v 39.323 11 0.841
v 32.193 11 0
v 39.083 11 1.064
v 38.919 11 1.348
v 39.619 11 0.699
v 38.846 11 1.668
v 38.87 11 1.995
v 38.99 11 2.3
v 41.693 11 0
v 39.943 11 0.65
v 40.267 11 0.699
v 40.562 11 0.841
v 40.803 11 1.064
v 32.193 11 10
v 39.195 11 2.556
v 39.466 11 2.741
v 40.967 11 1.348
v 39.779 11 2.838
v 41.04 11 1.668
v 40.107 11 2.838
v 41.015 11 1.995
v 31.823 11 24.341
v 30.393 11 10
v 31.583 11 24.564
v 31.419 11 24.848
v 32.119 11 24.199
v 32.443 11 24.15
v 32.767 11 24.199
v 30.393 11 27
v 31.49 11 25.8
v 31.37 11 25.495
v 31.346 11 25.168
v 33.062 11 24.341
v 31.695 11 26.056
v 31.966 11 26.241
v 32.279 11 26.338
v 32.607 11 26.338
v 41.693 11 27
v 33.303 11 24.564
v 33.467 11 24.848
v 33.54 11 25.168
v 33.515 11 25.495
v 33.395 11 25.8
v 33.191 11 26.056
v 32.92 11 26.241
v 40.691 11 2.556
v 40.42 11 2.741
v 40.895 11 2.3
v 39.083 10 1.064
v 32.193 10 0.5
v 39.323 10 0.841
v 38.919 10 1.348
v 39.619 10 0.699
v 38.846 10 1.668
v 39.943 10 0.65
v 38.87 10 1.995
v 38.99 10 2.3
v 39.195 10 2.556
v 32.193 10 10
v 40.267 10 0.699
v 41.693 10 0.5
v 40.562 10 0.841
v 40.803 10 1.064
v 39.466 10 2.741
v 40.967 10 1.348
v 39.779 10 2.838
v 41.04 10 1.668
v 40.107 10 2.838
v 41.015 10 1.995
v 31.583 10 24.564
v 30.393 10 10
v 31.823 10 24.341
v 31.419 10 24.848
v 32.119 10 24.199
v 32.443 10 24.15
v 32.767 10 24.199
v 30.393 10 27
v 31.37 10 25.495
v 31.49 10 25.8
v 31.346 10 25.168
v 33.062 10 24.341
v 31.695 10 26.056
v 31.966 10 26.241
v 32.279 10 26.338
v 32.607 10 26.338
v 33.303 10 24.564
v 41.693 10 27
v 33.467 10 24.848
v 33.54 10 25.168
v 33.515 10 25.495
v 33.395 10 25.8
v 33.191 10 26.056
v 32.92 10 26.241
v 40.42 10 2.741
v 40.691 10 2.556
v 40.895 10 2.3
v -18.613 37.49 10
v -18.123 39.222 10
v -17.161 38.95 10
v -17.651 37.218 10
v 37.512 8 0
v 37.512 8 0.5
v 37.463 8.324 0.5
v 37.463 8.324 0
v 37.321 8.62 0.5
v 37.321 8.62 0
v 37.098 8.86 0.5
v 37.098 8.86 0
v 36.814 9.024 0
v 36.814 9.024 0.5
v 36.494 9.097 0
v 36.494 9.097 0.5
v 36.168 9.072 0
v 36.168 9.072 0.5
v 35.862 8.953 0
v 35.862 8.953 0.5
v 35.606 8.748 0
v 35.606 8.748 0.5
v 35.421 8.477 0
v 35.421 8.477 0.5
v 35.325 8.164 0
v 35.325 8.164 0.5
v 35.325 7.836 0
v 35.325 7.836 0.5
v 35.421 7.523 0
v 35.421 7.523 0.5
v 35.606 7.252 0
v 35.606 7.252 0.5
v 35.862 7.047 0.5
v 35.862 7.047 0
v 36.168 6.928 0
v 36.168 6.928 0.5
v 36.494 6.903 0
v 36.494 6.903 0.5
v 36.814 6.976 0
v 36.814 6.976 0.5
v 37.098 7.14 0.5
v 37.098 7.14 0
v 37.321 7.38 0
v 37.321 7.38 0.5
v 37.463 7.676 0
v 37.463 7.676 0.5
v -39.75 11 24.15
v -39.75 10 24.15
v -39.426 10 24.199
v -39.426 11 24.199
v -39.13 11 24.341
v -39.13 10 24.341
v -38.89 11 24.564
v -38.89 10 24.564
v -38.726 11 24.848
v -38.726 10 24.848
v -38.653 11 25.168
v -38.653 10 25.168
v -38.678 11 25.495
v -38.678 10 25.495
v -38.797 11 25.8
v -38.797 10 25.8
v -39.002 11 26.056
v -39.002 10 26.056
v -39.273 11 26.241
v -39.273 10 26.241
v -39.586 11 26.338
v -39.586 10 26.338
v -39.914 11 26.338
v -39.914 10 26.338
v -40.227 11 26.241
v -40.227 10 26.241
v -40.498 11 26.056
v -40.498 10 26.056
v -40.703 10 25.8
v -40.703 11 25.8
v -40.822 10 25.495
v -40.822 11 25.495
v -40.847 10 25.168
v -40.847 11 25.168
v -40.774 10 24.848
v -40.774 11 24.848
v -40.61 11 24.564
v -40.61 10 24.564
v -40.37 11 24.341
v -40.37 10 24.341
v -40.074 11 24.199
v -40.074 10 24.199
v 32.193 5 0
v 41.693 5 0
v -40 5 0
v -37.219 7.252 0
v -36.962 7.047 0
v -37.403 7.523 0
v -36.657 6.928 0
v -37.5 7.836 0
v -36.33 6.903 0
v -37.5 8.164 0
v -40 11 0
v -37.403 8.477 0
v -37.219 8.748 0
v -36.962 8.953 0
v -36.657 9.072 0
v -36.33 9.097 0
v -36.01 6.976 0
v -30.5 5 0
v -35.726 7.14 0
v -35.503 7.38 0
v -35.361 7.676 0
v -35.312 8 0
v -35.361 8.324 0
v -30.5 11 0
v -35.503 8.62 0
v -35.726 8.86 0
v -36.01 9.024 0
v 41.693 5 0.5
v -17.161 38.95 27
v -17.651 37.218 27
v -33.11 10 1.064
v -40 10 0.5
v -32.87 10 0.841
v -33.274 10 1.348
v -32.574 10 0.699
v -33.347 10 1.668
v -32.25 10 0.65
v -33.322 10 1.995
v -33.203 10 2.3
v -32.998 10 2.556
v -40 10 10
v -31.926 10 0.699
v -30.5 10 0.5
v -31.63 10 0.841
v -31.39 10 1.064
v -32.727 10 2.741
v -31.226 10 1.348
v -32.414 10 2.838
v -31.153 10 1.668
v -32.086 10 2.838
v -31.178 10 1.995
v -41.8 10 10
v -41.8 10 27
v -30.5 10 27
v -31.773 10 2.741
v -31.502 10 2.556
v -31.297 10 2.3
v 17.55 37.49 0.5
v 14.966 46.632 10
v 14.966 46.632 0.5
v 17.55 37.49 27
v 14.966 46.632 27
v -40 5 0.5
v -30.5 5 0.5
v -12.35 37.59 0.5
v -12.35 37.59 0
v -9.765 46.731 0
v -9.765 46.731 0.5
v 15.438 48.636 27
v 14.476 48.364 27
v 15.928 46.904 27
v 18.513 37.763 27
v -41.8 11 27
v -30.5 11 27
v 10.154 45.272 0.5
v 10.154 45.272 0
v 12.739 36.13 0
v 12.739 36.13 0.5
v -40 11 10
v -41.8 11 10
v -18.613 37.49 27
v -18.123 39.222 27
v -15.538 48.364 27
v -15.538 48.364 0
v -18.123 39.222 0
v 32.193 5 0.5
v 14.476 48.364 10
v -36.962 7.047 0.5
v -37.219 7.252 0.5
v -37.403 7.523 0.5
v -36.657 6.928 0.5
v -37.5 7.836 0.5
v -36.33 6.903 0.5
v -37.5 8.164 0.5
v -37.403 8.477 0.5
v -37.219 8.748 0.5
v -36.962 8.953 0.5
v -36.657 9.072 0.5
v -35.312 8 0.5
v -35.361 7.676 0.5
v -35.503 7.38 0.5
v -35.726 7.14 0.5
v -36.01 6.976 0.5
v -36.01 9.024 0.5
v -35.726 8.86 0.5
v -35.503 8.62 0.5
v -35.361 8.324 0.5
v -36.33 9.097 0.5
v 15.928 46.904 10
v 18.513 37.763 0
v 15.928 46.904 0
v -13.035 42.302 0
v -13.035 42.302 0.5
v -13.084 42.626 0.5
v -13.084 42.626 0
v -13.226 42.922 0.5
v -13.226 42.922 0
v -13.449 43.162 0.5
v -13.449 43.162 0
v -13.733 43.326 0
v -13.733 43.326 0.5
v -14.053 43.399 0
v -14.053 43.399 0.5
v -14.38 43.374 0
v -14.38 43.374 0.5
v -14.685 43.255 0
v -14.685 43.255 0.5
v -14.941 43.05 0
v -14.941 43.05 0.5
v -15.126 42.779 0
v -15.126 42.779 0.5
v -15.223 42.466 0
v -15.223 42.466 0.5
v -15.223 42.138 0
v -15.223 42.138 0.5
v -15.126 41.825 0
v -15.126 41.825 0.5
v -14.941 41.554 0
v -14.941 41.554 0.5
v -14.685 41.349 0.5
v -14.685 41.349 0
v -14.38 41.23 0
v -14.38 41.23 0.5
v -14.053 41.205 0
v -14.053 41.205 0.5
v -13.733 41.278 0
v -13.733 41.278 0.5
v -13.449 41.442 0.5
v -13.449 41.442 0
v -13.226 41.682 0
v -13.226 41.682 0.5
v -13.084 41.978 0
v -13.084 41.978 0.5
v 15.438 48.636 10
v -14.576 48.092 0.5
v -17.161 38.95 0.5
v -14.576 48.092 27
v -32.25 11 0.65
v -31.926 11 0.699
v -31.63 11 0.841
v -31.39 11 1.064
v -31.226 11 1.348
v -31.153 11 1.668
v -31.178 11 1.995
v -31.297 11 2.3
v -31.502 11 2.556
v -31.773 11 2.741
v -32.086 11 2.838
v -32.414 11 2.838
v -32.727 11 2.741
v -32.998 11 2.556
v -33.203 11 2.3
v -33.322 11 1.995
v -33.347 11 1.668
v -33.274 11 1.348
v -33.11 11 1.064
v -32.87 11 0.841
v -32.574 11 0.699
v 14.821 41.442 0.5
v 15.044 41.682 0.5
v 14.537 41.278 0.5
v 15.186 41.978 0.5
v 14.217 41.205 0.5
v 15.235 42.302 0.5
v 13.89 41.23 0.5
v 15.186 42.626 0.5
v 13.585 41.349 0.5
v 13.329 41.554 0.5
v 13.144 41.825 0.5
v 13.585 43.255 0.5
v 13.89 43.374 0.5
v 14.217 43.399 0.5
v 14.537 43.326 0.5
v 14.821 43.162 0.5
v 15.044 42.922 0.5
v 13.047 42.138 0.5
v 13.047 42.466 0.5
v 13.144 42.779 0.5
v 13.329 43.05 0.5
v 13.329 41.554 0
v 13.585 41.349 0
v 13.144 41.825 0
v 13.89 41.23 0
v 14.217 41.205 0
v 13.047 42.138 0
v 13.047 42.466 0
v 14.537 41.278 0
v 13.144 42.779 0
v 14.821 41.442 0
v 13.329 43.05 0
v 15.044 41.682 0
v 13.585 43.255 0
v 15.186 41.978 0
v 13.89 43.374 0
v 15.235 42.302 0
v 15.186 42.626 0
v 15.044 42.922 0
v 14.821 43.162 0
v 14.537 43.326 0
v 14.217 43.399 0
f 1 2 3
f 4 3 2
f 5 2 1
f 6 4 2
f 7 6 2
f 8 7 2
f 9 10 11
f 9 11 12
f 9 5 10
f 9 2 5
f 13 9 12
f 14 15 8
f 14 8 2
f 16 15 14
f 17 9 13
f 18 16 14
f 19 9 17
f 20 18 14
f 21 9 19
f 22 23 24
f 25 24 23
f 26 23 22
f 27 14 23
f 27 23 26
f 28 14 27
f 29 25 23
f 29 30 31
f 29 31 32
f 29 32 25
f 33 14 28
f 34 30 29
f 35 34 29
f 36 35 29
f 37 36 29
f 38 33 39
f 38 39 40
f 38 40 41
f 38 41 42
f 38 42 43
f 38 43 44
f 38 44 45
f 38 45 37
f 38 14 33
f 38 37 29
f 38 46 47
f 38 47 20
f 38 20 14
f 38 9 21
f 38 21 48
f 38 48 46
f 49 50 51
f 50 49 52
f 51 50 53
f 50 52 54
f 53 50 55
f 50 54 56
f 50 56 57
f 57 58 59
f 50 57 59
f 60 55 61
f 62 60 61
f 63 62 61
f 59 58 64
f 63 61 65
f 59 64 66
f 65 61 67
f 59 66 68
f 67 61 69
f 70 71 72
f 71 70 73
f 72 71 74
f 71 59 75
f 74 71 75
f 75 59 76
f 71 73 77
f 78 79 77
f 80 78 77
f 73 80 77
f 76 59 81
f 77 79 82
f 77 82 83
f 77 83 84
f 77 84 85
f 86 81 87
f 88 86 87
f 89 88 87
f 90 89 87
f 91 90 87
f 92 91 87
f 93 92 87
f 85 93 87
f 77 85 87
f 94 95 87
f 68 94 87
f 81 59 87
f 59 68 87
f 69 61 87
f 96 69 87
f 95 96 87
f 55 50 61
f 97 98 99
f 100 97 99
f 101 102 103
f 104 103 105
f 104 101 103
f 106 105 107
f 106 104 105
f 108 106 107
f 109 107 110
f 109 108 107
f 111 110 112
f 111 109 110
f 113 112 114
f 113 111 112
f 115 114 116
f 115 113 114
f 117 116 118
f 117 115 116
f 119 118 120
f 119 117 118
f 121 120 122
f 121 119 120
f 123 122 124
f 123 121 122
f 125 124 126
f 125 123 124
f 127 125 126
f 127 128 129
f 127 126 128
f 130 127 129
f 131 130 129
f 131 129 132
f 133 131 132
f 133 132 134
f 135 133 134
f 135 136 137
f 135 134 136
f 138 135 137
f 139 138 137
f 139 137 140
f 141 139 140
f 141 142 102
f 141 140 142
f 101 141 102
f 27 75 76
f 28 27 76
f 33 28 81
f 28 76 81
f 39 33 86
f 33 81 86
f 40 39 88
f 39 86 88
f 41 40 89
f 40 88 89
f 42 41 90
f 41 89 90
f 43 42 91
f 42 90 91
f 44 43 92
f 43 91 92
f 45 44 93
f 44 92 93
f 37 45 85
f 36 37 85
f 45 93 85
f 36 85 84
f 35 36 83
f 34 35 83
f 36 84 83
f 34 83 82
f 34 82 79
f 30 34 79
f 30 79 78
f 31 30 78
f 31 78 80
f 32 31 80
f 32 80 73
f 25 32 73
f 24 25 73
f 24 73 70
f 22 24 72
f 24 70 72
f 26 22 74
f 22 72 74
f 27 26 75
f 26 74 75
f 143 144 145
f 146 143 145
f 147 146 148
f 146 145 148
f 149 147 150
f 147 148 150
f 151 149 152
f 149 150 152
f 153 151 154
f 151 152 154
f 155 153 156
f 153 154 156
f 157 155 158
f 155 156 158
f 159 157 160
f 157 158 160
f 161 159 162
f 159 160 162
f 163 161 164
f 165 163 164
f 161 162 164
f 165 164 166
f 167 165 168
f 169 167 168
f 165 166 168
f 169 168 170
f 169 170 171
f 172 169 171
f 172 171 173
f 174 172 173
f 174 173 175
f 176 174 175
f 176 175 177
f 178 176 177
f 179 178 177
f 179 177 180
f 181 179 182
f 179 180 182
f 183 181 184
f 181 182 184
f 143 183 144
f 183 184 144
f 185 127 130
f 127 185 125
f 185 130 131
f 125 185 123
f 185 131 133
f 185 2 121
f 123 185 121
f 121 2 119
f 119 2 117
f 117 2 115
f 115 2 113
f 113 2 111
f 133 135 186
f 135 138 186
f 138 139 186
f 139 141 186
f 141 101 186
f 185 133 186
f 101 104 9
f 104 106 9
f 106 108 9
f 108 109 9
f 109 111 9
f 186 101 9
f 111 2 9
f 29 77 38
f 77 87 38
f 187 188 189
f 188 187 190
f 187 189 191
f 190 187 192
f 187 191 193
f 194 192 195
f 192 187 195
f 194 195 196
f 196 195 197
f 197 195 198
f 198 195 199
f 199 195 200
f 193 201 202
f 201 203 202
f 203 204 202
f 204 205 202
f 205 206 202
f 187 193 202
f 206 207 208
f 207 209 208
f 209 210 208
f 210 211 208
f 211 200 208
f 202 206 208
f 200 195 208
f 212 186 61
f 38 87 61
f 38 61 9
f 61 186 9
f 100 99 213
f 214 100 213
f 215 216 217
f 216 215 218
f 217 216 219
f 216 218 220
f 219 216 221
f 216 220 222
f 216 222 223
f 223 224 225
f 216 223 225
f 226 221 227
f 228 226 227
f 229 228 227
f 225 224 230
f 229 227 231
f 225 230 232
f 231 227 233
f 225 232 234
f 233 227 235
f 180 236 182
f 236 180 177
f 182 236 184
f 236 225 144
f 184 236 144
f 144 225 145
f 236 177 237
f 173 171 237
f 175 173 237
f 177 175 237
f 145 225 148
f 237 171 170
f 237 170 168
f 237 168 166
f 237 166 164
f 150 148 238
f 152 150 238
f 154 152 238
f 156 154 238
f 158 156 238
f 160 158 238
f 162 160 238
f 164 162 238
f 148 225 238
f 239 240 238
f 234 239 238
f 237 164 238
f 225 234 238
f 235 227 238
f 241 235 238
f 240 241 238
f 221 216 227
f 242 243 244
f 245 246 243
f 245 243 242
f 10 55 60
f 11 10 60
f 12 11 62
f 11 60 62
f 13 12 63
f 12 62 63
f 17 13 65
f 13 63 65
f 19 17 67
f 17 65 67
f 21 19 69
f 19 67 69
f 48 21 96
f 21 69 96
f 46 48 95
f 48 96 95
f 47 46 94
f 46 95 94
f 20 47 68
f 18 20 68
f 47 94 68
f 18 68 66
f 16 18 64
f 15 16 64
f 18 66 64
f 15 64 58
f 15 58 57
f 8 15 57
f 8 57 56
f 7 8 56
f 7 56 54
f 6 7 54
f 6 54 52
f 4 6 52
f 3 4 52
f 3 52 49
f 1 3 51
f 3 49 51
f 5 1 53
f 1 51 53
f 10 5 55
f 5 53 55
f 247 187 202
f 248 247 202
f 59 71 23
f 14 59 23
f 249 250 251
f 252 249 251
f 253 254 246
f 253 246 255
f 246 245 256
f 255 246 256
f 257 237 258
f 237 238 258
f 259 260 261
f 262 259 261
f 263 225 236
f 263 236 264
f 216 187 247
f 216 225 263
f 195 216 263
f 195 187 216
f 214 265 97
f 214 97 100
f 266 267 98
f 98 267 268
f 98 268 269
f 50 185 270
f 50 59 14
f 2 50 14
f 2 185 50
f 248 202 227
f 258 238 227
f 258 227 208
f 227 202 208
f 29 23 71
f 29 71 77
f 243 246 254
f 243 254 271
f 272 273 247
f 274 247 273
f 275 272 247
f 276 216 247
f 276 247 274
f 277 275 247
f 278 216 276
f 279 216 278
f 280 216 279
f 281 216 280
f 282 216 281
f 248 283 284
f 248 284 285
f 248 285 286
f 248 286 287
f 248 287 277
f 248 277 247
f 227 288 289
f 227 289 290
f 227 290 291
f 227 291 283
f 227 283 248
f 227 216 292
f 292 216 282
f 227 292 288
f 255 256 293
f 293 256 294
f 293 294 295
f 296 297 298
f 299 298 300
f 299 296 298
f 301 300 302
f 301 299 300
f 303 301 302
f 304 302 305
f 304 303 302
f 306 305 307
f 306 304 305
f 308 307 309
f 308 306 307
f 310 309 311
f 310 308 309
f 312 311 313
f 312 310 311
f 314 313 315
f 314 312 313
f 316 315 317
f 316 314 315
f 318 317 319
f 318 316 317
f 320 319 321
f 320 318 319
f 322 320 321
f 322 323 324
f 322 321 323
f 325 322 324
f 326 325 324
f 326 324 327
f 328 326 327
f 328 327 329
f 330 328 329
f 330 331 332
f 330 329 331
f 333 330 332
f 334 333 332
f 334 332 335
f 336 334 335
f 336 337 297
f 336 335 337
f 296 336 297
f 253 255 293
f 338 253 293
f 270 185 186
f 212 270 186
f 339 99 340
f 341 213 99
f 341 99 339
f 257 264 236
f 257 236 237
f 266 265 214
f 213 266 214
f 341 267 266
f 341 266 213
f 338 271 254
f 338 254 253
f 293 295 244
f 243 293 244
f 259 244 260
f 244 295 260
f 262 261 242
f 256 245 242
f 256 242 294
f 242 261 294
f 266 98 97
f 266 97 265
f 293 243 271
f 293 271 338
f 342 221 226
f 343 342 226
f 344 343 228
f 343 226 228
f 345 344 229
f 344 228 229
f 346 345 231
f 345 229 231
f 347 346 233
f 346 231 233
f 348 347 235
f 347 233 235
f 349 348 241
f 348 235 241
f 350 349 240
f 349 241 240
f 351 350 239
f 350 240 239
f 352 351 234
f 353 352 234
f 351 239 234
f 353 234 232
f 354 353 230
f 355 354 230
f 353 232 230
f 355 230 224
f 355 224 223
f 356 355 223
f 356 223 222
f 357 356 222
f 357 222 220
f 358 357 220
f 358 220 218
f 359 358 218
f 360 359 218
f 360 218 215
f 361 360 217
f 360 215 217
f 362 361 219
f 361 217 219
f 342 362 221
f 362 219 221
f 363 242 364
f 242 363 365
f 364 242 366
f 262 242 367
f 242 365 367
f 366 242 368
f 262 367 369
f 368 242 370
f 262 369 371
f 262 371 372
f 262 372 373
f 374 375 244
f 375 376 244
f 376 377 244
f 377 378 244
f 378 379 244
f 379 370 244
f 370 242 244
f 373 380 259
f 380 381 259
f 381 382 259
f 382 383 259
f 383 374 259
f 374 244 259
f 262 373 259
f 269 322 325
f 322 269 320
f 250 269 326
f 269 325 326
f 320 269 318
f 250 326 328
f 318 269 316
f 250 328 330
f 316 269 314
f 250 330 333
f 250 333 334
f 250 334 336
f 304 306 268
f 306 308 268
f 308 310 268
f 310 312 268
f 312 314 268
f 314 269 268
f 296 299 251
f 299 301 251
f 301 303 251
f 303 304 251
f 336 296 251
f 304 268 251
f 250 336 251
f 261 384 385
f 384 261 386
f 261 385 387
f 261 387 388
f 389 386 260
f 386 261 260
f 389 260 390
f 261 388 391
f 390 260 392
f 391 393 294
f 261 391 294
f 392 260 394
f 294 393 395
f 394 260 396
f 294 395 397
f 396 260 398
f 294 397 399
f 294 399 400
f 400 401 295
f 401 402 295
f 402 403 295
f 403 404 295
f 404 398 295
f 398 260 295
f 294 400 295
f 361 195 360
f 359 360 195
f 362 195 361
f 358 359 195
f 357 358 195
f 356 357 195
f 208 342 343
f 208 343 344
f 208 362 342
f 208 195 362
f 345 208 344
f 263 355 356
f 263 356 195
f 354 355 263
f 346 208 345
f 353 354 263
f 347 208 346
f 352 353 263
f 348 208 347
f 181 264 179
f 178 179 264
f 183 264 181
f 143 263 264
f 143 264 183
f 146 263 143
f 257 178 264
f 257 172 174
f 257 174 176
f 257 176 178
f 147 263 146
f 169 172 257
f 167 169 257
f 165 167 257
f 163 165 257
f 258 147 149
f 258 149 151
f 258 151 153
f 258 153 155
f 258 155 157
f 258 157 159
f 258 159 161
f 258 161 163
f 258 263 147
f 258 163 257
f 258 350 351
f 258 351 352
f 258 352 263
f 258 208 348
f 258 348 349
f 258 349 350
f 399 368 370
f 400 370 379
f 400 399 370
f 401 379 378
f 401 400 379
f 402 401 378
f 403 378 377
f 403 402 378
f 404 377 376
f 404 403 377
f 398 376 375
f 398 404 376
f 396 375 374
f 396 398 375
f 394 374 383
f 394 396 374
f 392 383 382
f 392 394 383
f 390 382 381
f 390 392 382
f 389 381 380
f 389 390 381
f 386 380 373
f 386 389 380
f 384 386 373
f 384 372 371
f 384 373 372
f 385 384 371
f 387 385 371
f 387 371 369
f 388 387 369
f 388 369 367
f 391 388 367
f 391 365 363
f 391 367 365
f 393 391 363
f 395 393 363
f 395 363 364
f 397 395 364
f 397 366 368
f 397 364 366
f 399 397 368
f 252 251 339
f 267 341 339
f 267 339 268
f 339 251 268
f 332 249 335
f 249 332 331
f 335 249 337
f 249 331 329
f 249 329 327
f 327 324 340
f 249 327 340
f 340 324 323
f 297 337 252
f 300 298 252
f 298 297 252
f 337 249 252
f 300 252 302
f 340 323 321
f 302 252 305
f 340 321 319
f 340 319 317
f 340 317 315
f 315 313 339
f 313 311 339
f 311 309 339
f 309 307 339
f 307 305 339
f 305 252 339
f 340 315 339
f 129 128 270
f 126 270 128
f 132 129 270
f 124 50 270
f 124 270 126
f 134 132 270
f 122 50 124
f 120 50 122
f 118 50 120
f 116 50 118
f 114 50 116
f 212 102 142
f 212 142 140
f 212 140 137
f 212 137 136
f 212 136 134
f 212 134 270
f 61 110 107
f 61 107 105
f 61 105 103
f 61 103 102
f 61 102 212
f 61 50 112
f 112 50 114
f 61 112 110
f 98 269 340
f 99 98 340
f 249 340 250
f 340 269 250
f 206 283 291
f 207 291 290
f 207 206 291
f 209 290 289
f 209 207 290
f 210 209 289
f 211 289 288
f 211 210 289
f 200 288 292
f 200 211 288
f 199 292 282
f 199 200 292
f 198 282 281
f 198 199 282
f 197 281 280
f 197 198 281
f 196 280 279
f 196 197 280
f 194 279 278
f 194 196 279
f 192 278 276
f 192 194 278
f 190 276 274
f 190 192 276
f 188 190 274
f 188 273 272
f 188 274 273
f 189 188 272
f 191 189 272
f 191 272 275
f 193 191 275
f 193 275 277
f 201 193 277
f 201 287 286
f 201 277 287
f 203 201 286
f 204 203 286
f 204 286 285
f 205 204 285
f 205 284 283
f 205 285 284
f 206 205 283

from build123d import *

# Parameters (mm, degrees)
SKETCH1_W             = 9.5
SKETCH1_H             = 6
SKETCH1_R             = 1.1
BOSS_EXTRUDE1_DEPTH   = 27
BOSS_EXTRUDE1_2_DEPTH = 27
BOSS_EXTRUDE1_3_DEPTH = 27
BOSS_EXTRUDE1_4_DEPTH = 27
SKETCH2_W             = 9.5
SKETCH2_H             = 5
CUT_EXTRUDE1_DEPTH    = 26.5
SKETCH3_W             = 17
SKETCH3_H             = 1
BOSS_EXTRUDE2_DEPTH   = 1.8
SKETCH4_W             = 17
SKETCH4_H             = 1
BOSS_EXTRUDE3_DEPTH   = 1.8
SKETCH5_W             = 1
SKETCH5_H             = 17
BOSS_EXTRUDE4_DEPTH   = 1.8
SKETCH6_W             = 1
SKETCH6_H             = 17
BOSS_EXTRUDE5_DEPTH   = 1.8
SKETCH7_R             = 1.1
CUT_EXTRUDE2_DEPTH    = 1


with BuildPart() as part:
    # Sketch1 → Boss-Extrude1 (new body)
    with BuildSketch(Plane.XY):
        with Locations((-35.25, 8)):
            Rectangle(SKETCH1_W, SKETCH1_H)
        with Locations((-36.412283149, 8)):
            Circle(SKETCH1_R, mode=Mode.SUBTRACT)
    extrude(amount=BOSS_EXTRUDE1_DEPTH)


with BuildPart() as body_2:
    # Sketch1 → Boss-Extrude1 2 (new body)
    with BuildSketch(Plane.XY):
        with Locations((36.942810861, 8)):
            Rectangle(SKETCH1_W, SKETCH1_H)
        with Locations((36.412283149, 8)):
            Circle(SKETCH1_R, mode=Mode.SUBTRACT)
    extrude(amount=BOSS_EXTRUDE1_2_DEPTH)


with BuildPart() as body_3:
    # Sketch1 → Boss-Extrude1 3 (new body)
    with BuildSketch(Plane.XY):
        Polygon((15.927890045, 46.904142594), (10.154262619, 45.271590498), (12.73913677, 36.13001374), (18.512764196, 37.762565836), align=None)
        with Locations((14.134917172, 42.301953571)):
            Circle(SKETCH1_R, mode=Mode.SUBTRACT)
    extrude(amount=BOSS_EXTRUDE1_3_DEPTH)


with BuildPart() as body_4:
    # Sketch1 → Boss-Extrude1 4 (new body)
    with BuildSketch(Plane.XY):
        Polygon((-18.123322327, 39.222379323), (-12.349694901, 37.589827228), (-9.76482075, 46.731403985), (-15.538448176, 48.363956081), align=None)
        with Locations((-14.134917172, 42.301953571)):
            Circle(SKETCH1_R, mode=Mode.SUBTRACT)
    extrude(amount=BOSS_EXTRUDE1_4_DEPTH)


with BuildPart() as cut_extrude1_tool:
    # Sketch2 → Cut-Extrude1 (new body)
    with BuildSketch(Plane.XY.offset(27)):
        with Locations((-35.25, 7.5)):
            Rectangle(SKETCH2_W, SKETCH2_H)
        Polygon((-12.349694901, 37.589827228), (-17.16105109, 38.950287307), (-14.576176938, 48.091864065), (-9.76482075, 46.731403985), align=None)
        Polygon((10.154262619, 45.271590498), (14.965618807, 46.632050578), (17.550492959, 37.49047382), (12.73913677, 36.13001374), align=None)
        with Locations((36.942810861, 7.5)):
            Rectangle(SKETCH2_W, SKETCH2_H)
    extrude(amount=-CUT_EXTRUDE1_DEPTH)


with BuildPart() as part_1:
    add(part.part)

    # Cut-Extrude1: cut by cut_extrude1_tool
    add(cut_extrude1_tool.part, mode=Mode.SUBTRACT)

    # Sketch3 → Boss-Extrude2 (add)
    with BuildSketch(Plane.ZY.offset(40)):
        with Locations((18.5, 10.5)):
            Rectangle(SKETCH3_W, SKETCH3_H)
    extrude(amount=BOSS_EXTRUDE2_DEPTH)


with BuildPart() as body_2_1:
    add(body_2.part)

    # Cut-Extrude1: cut by cut_extrude1_tool
    add(cut_extrude1_tool.part, mode=Mode.SUBTRACT)

    # Sketch4 → Boss-Extrude3 (add)
    with BuildSketch(Plane.ZY.offset(-32.192810861)):
        with Locations((18.5, 10.5)):
            Rectangle(SKETCH4_W, SKETCH4_H)
    extrude(amount=BOSS_EXTRUDE3_DEPTH)


with BuildPart() as body_3_1:
    add(body_3.part)

    # Cut-Extrude1: cut by cut_extrude1_tool
    add(cut_extrude1_tool.part, mode=Mode.SUBTRACT)

    # Sketch5 → Boss-Extrude4 (add)
    with BuildSketch(Plane(origin=(-11.101532643, 39.261297395, 0), x_dir=(0.9622712376779518, 0.272092015938989, 0), z_dir=(-0.27209201593898896, 0.9622712376779516, 0))):
        with Locations((27.589193181, -18.5)):
            Rectangle(SKETCH5_W, SKETCH5_H)
    extrude(amount=BOSS_EXTRUDE4_DEPTH)


with BuildPart() as body_4_1:
    add(body_4.part)

    # Cut-Extrude1: cut by cut_extrude1_tool
    add(cut_extrude1_tool.part, mode=Mode.SUBTRACT)

    # Sketch6 → Boss-Extrude5 (add)
    with BuildSketch(Plane(origin=(8.927708051, 31.573424329, 0), x_dir=(0.9622712376779494, -0.2720920159389969, 0), z_dir=(-0.2720920159389969, -0.9622712376779494, 0))):
        with Locations((-27.611648067, 18.5)):
            Rectangle(SKETCH6_W, SKETCH6_H)
    extrude(amount=BOSS_EXTRUDE5_DEPTH)


with BuildPart() as cut_extrude2_tool:
    # Sketch7 → Cut-Extrude2 (new body)
    with BuildSketch(Plane.XZ.offset(-10)):
        with Locations(Location((32.442810861, 25.25, 0), (0, 0, 270))):
            Circle(SKETCH7_R)
        with Locations(Location((39.942810861, 1.75, 0), (0, 0, 270))):
            Circle(SKETCH7_R)
        with Locations(Location((-39.75, 25.25, 0), (0, 0, 270))):
            Circle(SKETCH7_R)
        with Locations(Location((-32.25, 1.75, 0), (0, 0, 270))):
            Circle(SKETCH7_R)
    extrude(amount=-CUT_EXTRUDE2_DEPTH)


with BuildPart() as part_2:
    add(part_1.part)

    # Cut-Extrude2: cut by cut_extrude2_tool
    add(cut_extrude2_tool.part, mode=Mode.SUBTRACT)


with BuildPart() as body_2_2:
    add(body_2_1.part)

    # Cut-Extrude2: cut by cut_extrude2_tool
    add(cut_extrude2_tool.part, mode=Mode.SUBTRACT)


solid = Compound([body_3_1.part, body_4_1.part, part_2.part, body_2_2.part])
